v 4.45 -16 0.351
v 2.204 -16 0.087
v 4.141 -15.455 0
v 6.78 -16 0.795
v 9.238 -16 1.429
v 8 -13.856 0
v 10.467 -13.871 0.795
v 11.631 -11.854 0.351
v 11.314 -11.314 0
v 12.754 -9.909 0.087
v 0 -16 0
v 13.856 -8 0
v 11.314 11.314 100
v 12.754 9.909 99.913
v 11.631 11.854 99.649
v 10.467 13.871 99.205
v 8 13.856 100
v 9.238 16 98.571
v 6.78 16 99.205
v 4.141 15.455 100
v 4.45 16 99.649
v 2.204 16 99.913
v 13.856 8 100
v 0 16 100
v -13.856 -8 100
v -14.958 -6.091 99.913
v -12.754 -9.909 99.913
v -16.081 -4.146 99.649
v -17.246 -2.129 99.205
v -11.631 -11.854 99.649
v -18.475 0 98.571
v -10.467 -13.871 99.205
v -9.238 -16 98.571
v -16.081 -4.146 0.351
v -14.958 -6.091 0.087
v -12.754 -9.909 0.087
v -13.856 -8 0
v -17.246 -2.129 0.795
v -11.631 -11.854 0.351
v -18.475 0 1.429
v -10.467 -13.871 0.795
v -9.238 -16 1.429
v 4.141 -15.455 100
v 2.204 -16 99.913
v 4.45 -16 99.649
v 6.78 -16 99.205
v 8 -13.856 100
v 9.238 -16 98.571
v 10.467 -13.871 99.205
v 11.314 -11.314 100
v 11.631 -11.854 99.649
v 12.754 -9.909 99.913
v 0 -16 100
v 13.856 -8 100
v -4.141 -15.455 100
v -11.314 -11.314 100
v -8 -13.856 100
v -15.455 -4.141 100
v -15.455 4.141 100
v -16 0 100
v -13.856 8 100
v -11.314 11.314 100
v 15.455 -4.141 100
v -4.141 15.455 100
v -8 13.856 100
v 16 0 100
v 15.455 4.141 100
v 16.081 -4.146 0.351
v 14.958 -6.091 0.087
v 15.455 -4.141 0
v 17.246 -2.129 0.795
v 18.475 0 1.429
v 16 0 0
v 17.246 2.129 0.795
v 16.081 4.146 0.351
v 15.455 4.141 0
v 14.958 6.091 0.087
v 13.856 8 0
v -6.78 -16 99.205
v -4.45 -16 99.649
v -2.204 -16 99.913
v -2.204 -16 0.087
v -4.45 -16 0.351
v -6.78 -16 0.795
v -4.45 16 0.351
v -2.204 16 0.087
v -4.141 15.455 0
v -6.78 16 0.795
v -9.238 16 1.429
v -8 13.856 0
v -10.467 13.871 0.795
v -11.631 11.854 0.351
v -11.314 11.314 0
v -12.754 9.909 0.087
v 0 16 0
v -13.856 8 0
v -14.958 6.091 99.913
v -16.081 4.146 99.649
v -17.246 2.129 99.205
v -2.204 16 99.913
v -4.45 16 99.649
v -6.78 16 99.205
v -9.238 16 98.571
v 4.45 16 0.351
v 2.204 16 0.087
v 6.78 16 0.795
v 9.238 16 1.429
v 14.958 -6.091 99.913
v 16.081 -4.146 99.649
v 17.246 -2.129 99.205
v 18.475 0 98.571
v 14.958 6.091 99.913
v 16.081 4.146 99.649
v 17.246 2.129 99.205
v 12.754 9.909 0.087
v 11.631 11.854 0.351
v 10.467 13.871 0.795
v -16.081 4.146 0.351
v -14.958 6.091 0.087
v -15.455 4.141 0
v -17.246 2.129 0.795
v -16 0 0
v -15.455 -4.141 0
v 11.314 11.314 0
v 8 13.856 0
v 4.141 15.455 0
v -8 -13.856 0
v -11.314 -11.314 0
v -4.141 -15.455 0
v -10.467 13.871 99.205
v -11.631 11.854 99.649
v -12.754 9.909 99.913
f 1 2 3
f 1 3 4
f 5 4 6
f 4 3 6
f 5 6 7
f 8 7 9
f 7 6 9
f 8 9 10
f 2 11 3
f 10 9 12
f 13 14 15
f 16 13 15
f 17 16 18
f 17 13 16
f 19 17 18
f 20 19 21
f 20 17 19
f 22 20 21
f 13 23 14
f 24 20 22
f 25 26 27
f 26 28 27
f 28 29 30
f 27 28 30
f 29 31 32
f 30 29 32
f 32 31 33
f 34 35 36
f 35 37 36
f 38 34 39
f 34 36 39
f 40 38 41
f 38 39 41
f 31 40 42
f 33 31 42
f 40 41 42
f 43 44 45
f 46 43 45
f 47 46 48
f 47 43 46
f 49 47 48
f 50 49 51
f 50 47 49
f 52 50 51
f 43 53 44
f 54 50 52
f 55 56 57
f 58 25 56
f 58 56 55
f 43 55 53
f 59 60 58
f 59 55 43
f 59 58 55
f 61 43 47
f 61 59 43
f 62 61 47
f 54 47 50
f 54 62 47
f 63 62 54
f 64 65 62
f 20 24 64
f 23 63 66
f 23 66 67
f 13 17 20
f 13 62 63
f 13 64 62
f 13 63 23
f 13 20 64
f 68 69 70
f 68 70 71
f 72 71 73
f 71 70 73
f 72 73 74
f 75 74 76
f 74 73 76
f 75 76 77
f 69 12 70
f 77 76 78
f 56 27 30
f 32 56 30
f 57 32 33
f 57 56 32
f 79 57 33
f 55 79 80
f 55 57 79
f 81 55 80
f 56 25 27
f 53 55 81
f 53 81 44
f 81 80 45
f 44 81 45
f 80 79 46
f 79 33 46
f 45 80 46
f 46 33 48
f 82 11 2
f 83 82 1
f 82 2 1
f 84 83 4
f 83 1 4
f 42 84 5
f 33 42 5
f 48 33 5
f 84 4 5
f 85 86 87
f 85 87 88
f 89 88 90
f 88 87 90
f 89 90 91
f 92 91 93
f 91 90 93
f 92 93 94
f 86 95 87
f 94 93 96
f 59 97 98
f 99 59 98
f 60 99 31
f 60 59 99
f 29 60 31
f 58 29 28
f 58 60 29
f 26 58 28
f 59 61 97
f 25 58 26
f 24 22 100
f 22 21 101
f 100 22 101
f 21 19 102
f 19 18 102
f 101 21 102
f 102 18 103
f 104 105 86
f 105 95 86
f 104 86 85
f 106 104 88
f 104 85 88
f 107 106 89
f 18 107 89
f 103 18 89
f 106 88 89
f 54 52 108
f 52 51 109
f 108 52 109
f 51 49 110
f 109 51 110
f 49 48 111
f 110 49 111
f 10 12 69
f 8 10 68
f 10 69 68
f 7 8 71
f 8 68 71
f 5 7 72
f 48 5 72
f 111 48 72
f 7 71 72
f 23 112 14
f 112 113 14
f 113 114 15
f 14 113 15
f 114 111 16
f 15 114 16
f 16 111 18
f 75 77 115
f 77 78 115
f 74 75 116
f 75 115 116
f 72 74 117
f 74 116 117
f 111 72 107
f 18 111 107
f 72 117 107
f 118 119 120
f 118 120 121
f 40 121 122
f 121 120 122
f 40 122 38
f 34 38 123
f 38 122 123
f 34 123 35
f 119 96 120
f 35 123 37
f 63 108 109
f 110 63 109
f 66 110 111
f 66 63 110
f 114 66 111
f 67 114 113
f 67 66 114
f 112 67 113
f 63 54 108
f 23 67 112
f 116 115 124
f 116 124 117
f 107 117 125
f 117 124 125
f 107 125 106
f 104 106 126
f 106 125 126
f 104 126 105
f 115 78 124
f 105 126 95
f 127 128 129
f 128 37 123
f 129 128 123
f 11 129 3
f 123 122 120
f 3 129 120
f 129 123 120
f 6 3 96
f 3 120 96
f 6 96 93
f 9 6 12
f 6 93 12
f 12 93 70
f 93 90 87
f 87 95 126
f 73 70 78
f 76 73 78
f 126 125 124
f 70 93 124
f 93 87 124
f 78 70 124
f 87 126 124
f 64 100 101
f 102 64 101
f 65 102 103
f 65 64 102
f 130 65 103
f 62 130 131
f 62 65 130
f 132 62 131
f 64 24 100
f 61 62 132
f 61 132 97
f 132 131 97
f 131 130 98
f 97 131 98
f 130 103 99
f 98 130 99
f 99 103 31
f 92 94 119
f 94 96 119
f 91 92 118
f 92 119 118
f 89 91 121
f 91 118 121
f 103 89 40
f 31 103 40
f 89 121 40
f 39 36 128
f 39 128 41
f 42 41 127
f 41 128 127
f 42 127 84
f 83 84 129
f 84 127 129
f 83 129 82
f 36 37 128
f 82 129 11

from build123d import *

# Parameters (mm, degrees)
BOSS_EXTRUDE1_DEPTH = 100


with BuildPart() as part:
    # Sketch1 → Boss-Extrude1 (new body)
    with BuildSketch(Plane.XY):
        Polygon((18.475208614, 0), (9.237604307, 16), (-9.237604307, 16), (-18.475208614, 0), (-9.237604307, -16), (9.237604307, -16), align=None)
    extrude(amount=BOSS_EXTRUDE1_DEPTH)

    # Sketch2 → Cut-Revolve1 (revolve, cut)
    with BuildSketch(Plane(origin=(0, 0, 0), x_dir=(0, 0, -1), z_dir=(1, 0, 0))):
        Polygon((-100, 16), (-100, 22.884653205), (-96.025143619, 22.884653205), align=None)
        Polygon((0, 22.884653205), (-3.974856381, 22.884653205), (0, 16), align=None)
    revolve(axis=Axis((0, 0, 0), (0, 0, 1)), mode=Mode.SUBTRACT)


solid = part.part
